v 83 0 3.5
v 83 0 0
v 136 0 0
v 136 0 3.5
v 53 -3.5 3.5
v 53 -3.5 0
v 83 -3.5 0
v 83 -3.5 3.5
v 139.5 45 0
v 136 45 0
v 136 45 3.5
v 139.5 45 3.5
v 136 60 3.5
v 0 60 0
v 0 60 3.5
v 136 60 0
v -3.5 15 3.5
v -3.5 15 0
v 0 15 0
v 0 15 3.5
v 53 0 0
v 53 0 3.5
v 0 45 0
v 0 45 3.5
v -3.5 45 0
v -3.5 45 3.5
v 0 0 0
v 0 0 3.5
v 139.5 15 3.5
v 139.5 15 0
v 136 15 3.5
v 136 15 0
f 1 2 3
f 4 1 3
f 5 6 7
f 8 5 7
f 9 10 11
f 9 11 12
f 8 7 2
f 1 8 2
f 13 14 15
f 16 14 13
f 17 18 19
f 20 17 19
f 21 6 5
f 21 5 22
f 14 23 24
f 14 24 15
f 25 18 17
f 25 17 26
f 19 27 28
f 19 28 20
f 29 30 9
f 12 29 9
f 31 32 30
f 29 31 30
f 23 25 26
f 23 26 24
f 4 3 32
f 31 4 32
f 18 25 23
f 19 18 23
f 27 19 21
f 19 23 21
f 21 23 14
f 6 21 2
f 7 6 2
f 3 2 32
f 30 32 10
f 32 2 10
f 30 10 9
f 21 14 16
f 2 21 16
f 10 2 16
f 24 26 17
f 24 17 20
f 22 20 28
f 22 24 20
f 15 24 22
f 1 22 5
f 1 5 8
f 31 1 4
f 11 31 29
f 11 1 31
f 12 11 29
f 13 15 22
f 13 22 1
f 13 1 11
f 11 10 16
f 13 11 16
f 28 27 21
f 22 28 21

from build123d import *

# Parameters (mm, degrees)
SKETCH_1_W      = 136
SKETCH_1_H      = 60
SKETCH_1_W_2    = 3.5
SKETCH_1_H_2    = 30
SKETCH_1_W_3    = 30
SKETCH_1_H_3    = 3.5
EXTRUDE_1_DEPTH = 3.5


with BuildPart() as part:
    # Эскиз1 → Бобышка-Вытянуть1 (new body)
    with BuildSketch(Plane.XY):
        with Locations((68, 30)):
            Rectangle(SKETCH_1_W, SKETCH_1_H)
        with Locations((-1.75, 30)):
            Rectangle(SKETCH_1_W_2, SKETCH_1_H_2)
        with Locations((137.75, 30)):
            Rectangle(SKETCH_1_W_2, SKETCH_1_H_2)
        with Locations((68, -1.75)):
            Rectangle(SKETCH_1_W_3, SKETCH_1_H_3)
    extrude(amount=EXTRUDE_1_DEPTH)


solid = part.part
